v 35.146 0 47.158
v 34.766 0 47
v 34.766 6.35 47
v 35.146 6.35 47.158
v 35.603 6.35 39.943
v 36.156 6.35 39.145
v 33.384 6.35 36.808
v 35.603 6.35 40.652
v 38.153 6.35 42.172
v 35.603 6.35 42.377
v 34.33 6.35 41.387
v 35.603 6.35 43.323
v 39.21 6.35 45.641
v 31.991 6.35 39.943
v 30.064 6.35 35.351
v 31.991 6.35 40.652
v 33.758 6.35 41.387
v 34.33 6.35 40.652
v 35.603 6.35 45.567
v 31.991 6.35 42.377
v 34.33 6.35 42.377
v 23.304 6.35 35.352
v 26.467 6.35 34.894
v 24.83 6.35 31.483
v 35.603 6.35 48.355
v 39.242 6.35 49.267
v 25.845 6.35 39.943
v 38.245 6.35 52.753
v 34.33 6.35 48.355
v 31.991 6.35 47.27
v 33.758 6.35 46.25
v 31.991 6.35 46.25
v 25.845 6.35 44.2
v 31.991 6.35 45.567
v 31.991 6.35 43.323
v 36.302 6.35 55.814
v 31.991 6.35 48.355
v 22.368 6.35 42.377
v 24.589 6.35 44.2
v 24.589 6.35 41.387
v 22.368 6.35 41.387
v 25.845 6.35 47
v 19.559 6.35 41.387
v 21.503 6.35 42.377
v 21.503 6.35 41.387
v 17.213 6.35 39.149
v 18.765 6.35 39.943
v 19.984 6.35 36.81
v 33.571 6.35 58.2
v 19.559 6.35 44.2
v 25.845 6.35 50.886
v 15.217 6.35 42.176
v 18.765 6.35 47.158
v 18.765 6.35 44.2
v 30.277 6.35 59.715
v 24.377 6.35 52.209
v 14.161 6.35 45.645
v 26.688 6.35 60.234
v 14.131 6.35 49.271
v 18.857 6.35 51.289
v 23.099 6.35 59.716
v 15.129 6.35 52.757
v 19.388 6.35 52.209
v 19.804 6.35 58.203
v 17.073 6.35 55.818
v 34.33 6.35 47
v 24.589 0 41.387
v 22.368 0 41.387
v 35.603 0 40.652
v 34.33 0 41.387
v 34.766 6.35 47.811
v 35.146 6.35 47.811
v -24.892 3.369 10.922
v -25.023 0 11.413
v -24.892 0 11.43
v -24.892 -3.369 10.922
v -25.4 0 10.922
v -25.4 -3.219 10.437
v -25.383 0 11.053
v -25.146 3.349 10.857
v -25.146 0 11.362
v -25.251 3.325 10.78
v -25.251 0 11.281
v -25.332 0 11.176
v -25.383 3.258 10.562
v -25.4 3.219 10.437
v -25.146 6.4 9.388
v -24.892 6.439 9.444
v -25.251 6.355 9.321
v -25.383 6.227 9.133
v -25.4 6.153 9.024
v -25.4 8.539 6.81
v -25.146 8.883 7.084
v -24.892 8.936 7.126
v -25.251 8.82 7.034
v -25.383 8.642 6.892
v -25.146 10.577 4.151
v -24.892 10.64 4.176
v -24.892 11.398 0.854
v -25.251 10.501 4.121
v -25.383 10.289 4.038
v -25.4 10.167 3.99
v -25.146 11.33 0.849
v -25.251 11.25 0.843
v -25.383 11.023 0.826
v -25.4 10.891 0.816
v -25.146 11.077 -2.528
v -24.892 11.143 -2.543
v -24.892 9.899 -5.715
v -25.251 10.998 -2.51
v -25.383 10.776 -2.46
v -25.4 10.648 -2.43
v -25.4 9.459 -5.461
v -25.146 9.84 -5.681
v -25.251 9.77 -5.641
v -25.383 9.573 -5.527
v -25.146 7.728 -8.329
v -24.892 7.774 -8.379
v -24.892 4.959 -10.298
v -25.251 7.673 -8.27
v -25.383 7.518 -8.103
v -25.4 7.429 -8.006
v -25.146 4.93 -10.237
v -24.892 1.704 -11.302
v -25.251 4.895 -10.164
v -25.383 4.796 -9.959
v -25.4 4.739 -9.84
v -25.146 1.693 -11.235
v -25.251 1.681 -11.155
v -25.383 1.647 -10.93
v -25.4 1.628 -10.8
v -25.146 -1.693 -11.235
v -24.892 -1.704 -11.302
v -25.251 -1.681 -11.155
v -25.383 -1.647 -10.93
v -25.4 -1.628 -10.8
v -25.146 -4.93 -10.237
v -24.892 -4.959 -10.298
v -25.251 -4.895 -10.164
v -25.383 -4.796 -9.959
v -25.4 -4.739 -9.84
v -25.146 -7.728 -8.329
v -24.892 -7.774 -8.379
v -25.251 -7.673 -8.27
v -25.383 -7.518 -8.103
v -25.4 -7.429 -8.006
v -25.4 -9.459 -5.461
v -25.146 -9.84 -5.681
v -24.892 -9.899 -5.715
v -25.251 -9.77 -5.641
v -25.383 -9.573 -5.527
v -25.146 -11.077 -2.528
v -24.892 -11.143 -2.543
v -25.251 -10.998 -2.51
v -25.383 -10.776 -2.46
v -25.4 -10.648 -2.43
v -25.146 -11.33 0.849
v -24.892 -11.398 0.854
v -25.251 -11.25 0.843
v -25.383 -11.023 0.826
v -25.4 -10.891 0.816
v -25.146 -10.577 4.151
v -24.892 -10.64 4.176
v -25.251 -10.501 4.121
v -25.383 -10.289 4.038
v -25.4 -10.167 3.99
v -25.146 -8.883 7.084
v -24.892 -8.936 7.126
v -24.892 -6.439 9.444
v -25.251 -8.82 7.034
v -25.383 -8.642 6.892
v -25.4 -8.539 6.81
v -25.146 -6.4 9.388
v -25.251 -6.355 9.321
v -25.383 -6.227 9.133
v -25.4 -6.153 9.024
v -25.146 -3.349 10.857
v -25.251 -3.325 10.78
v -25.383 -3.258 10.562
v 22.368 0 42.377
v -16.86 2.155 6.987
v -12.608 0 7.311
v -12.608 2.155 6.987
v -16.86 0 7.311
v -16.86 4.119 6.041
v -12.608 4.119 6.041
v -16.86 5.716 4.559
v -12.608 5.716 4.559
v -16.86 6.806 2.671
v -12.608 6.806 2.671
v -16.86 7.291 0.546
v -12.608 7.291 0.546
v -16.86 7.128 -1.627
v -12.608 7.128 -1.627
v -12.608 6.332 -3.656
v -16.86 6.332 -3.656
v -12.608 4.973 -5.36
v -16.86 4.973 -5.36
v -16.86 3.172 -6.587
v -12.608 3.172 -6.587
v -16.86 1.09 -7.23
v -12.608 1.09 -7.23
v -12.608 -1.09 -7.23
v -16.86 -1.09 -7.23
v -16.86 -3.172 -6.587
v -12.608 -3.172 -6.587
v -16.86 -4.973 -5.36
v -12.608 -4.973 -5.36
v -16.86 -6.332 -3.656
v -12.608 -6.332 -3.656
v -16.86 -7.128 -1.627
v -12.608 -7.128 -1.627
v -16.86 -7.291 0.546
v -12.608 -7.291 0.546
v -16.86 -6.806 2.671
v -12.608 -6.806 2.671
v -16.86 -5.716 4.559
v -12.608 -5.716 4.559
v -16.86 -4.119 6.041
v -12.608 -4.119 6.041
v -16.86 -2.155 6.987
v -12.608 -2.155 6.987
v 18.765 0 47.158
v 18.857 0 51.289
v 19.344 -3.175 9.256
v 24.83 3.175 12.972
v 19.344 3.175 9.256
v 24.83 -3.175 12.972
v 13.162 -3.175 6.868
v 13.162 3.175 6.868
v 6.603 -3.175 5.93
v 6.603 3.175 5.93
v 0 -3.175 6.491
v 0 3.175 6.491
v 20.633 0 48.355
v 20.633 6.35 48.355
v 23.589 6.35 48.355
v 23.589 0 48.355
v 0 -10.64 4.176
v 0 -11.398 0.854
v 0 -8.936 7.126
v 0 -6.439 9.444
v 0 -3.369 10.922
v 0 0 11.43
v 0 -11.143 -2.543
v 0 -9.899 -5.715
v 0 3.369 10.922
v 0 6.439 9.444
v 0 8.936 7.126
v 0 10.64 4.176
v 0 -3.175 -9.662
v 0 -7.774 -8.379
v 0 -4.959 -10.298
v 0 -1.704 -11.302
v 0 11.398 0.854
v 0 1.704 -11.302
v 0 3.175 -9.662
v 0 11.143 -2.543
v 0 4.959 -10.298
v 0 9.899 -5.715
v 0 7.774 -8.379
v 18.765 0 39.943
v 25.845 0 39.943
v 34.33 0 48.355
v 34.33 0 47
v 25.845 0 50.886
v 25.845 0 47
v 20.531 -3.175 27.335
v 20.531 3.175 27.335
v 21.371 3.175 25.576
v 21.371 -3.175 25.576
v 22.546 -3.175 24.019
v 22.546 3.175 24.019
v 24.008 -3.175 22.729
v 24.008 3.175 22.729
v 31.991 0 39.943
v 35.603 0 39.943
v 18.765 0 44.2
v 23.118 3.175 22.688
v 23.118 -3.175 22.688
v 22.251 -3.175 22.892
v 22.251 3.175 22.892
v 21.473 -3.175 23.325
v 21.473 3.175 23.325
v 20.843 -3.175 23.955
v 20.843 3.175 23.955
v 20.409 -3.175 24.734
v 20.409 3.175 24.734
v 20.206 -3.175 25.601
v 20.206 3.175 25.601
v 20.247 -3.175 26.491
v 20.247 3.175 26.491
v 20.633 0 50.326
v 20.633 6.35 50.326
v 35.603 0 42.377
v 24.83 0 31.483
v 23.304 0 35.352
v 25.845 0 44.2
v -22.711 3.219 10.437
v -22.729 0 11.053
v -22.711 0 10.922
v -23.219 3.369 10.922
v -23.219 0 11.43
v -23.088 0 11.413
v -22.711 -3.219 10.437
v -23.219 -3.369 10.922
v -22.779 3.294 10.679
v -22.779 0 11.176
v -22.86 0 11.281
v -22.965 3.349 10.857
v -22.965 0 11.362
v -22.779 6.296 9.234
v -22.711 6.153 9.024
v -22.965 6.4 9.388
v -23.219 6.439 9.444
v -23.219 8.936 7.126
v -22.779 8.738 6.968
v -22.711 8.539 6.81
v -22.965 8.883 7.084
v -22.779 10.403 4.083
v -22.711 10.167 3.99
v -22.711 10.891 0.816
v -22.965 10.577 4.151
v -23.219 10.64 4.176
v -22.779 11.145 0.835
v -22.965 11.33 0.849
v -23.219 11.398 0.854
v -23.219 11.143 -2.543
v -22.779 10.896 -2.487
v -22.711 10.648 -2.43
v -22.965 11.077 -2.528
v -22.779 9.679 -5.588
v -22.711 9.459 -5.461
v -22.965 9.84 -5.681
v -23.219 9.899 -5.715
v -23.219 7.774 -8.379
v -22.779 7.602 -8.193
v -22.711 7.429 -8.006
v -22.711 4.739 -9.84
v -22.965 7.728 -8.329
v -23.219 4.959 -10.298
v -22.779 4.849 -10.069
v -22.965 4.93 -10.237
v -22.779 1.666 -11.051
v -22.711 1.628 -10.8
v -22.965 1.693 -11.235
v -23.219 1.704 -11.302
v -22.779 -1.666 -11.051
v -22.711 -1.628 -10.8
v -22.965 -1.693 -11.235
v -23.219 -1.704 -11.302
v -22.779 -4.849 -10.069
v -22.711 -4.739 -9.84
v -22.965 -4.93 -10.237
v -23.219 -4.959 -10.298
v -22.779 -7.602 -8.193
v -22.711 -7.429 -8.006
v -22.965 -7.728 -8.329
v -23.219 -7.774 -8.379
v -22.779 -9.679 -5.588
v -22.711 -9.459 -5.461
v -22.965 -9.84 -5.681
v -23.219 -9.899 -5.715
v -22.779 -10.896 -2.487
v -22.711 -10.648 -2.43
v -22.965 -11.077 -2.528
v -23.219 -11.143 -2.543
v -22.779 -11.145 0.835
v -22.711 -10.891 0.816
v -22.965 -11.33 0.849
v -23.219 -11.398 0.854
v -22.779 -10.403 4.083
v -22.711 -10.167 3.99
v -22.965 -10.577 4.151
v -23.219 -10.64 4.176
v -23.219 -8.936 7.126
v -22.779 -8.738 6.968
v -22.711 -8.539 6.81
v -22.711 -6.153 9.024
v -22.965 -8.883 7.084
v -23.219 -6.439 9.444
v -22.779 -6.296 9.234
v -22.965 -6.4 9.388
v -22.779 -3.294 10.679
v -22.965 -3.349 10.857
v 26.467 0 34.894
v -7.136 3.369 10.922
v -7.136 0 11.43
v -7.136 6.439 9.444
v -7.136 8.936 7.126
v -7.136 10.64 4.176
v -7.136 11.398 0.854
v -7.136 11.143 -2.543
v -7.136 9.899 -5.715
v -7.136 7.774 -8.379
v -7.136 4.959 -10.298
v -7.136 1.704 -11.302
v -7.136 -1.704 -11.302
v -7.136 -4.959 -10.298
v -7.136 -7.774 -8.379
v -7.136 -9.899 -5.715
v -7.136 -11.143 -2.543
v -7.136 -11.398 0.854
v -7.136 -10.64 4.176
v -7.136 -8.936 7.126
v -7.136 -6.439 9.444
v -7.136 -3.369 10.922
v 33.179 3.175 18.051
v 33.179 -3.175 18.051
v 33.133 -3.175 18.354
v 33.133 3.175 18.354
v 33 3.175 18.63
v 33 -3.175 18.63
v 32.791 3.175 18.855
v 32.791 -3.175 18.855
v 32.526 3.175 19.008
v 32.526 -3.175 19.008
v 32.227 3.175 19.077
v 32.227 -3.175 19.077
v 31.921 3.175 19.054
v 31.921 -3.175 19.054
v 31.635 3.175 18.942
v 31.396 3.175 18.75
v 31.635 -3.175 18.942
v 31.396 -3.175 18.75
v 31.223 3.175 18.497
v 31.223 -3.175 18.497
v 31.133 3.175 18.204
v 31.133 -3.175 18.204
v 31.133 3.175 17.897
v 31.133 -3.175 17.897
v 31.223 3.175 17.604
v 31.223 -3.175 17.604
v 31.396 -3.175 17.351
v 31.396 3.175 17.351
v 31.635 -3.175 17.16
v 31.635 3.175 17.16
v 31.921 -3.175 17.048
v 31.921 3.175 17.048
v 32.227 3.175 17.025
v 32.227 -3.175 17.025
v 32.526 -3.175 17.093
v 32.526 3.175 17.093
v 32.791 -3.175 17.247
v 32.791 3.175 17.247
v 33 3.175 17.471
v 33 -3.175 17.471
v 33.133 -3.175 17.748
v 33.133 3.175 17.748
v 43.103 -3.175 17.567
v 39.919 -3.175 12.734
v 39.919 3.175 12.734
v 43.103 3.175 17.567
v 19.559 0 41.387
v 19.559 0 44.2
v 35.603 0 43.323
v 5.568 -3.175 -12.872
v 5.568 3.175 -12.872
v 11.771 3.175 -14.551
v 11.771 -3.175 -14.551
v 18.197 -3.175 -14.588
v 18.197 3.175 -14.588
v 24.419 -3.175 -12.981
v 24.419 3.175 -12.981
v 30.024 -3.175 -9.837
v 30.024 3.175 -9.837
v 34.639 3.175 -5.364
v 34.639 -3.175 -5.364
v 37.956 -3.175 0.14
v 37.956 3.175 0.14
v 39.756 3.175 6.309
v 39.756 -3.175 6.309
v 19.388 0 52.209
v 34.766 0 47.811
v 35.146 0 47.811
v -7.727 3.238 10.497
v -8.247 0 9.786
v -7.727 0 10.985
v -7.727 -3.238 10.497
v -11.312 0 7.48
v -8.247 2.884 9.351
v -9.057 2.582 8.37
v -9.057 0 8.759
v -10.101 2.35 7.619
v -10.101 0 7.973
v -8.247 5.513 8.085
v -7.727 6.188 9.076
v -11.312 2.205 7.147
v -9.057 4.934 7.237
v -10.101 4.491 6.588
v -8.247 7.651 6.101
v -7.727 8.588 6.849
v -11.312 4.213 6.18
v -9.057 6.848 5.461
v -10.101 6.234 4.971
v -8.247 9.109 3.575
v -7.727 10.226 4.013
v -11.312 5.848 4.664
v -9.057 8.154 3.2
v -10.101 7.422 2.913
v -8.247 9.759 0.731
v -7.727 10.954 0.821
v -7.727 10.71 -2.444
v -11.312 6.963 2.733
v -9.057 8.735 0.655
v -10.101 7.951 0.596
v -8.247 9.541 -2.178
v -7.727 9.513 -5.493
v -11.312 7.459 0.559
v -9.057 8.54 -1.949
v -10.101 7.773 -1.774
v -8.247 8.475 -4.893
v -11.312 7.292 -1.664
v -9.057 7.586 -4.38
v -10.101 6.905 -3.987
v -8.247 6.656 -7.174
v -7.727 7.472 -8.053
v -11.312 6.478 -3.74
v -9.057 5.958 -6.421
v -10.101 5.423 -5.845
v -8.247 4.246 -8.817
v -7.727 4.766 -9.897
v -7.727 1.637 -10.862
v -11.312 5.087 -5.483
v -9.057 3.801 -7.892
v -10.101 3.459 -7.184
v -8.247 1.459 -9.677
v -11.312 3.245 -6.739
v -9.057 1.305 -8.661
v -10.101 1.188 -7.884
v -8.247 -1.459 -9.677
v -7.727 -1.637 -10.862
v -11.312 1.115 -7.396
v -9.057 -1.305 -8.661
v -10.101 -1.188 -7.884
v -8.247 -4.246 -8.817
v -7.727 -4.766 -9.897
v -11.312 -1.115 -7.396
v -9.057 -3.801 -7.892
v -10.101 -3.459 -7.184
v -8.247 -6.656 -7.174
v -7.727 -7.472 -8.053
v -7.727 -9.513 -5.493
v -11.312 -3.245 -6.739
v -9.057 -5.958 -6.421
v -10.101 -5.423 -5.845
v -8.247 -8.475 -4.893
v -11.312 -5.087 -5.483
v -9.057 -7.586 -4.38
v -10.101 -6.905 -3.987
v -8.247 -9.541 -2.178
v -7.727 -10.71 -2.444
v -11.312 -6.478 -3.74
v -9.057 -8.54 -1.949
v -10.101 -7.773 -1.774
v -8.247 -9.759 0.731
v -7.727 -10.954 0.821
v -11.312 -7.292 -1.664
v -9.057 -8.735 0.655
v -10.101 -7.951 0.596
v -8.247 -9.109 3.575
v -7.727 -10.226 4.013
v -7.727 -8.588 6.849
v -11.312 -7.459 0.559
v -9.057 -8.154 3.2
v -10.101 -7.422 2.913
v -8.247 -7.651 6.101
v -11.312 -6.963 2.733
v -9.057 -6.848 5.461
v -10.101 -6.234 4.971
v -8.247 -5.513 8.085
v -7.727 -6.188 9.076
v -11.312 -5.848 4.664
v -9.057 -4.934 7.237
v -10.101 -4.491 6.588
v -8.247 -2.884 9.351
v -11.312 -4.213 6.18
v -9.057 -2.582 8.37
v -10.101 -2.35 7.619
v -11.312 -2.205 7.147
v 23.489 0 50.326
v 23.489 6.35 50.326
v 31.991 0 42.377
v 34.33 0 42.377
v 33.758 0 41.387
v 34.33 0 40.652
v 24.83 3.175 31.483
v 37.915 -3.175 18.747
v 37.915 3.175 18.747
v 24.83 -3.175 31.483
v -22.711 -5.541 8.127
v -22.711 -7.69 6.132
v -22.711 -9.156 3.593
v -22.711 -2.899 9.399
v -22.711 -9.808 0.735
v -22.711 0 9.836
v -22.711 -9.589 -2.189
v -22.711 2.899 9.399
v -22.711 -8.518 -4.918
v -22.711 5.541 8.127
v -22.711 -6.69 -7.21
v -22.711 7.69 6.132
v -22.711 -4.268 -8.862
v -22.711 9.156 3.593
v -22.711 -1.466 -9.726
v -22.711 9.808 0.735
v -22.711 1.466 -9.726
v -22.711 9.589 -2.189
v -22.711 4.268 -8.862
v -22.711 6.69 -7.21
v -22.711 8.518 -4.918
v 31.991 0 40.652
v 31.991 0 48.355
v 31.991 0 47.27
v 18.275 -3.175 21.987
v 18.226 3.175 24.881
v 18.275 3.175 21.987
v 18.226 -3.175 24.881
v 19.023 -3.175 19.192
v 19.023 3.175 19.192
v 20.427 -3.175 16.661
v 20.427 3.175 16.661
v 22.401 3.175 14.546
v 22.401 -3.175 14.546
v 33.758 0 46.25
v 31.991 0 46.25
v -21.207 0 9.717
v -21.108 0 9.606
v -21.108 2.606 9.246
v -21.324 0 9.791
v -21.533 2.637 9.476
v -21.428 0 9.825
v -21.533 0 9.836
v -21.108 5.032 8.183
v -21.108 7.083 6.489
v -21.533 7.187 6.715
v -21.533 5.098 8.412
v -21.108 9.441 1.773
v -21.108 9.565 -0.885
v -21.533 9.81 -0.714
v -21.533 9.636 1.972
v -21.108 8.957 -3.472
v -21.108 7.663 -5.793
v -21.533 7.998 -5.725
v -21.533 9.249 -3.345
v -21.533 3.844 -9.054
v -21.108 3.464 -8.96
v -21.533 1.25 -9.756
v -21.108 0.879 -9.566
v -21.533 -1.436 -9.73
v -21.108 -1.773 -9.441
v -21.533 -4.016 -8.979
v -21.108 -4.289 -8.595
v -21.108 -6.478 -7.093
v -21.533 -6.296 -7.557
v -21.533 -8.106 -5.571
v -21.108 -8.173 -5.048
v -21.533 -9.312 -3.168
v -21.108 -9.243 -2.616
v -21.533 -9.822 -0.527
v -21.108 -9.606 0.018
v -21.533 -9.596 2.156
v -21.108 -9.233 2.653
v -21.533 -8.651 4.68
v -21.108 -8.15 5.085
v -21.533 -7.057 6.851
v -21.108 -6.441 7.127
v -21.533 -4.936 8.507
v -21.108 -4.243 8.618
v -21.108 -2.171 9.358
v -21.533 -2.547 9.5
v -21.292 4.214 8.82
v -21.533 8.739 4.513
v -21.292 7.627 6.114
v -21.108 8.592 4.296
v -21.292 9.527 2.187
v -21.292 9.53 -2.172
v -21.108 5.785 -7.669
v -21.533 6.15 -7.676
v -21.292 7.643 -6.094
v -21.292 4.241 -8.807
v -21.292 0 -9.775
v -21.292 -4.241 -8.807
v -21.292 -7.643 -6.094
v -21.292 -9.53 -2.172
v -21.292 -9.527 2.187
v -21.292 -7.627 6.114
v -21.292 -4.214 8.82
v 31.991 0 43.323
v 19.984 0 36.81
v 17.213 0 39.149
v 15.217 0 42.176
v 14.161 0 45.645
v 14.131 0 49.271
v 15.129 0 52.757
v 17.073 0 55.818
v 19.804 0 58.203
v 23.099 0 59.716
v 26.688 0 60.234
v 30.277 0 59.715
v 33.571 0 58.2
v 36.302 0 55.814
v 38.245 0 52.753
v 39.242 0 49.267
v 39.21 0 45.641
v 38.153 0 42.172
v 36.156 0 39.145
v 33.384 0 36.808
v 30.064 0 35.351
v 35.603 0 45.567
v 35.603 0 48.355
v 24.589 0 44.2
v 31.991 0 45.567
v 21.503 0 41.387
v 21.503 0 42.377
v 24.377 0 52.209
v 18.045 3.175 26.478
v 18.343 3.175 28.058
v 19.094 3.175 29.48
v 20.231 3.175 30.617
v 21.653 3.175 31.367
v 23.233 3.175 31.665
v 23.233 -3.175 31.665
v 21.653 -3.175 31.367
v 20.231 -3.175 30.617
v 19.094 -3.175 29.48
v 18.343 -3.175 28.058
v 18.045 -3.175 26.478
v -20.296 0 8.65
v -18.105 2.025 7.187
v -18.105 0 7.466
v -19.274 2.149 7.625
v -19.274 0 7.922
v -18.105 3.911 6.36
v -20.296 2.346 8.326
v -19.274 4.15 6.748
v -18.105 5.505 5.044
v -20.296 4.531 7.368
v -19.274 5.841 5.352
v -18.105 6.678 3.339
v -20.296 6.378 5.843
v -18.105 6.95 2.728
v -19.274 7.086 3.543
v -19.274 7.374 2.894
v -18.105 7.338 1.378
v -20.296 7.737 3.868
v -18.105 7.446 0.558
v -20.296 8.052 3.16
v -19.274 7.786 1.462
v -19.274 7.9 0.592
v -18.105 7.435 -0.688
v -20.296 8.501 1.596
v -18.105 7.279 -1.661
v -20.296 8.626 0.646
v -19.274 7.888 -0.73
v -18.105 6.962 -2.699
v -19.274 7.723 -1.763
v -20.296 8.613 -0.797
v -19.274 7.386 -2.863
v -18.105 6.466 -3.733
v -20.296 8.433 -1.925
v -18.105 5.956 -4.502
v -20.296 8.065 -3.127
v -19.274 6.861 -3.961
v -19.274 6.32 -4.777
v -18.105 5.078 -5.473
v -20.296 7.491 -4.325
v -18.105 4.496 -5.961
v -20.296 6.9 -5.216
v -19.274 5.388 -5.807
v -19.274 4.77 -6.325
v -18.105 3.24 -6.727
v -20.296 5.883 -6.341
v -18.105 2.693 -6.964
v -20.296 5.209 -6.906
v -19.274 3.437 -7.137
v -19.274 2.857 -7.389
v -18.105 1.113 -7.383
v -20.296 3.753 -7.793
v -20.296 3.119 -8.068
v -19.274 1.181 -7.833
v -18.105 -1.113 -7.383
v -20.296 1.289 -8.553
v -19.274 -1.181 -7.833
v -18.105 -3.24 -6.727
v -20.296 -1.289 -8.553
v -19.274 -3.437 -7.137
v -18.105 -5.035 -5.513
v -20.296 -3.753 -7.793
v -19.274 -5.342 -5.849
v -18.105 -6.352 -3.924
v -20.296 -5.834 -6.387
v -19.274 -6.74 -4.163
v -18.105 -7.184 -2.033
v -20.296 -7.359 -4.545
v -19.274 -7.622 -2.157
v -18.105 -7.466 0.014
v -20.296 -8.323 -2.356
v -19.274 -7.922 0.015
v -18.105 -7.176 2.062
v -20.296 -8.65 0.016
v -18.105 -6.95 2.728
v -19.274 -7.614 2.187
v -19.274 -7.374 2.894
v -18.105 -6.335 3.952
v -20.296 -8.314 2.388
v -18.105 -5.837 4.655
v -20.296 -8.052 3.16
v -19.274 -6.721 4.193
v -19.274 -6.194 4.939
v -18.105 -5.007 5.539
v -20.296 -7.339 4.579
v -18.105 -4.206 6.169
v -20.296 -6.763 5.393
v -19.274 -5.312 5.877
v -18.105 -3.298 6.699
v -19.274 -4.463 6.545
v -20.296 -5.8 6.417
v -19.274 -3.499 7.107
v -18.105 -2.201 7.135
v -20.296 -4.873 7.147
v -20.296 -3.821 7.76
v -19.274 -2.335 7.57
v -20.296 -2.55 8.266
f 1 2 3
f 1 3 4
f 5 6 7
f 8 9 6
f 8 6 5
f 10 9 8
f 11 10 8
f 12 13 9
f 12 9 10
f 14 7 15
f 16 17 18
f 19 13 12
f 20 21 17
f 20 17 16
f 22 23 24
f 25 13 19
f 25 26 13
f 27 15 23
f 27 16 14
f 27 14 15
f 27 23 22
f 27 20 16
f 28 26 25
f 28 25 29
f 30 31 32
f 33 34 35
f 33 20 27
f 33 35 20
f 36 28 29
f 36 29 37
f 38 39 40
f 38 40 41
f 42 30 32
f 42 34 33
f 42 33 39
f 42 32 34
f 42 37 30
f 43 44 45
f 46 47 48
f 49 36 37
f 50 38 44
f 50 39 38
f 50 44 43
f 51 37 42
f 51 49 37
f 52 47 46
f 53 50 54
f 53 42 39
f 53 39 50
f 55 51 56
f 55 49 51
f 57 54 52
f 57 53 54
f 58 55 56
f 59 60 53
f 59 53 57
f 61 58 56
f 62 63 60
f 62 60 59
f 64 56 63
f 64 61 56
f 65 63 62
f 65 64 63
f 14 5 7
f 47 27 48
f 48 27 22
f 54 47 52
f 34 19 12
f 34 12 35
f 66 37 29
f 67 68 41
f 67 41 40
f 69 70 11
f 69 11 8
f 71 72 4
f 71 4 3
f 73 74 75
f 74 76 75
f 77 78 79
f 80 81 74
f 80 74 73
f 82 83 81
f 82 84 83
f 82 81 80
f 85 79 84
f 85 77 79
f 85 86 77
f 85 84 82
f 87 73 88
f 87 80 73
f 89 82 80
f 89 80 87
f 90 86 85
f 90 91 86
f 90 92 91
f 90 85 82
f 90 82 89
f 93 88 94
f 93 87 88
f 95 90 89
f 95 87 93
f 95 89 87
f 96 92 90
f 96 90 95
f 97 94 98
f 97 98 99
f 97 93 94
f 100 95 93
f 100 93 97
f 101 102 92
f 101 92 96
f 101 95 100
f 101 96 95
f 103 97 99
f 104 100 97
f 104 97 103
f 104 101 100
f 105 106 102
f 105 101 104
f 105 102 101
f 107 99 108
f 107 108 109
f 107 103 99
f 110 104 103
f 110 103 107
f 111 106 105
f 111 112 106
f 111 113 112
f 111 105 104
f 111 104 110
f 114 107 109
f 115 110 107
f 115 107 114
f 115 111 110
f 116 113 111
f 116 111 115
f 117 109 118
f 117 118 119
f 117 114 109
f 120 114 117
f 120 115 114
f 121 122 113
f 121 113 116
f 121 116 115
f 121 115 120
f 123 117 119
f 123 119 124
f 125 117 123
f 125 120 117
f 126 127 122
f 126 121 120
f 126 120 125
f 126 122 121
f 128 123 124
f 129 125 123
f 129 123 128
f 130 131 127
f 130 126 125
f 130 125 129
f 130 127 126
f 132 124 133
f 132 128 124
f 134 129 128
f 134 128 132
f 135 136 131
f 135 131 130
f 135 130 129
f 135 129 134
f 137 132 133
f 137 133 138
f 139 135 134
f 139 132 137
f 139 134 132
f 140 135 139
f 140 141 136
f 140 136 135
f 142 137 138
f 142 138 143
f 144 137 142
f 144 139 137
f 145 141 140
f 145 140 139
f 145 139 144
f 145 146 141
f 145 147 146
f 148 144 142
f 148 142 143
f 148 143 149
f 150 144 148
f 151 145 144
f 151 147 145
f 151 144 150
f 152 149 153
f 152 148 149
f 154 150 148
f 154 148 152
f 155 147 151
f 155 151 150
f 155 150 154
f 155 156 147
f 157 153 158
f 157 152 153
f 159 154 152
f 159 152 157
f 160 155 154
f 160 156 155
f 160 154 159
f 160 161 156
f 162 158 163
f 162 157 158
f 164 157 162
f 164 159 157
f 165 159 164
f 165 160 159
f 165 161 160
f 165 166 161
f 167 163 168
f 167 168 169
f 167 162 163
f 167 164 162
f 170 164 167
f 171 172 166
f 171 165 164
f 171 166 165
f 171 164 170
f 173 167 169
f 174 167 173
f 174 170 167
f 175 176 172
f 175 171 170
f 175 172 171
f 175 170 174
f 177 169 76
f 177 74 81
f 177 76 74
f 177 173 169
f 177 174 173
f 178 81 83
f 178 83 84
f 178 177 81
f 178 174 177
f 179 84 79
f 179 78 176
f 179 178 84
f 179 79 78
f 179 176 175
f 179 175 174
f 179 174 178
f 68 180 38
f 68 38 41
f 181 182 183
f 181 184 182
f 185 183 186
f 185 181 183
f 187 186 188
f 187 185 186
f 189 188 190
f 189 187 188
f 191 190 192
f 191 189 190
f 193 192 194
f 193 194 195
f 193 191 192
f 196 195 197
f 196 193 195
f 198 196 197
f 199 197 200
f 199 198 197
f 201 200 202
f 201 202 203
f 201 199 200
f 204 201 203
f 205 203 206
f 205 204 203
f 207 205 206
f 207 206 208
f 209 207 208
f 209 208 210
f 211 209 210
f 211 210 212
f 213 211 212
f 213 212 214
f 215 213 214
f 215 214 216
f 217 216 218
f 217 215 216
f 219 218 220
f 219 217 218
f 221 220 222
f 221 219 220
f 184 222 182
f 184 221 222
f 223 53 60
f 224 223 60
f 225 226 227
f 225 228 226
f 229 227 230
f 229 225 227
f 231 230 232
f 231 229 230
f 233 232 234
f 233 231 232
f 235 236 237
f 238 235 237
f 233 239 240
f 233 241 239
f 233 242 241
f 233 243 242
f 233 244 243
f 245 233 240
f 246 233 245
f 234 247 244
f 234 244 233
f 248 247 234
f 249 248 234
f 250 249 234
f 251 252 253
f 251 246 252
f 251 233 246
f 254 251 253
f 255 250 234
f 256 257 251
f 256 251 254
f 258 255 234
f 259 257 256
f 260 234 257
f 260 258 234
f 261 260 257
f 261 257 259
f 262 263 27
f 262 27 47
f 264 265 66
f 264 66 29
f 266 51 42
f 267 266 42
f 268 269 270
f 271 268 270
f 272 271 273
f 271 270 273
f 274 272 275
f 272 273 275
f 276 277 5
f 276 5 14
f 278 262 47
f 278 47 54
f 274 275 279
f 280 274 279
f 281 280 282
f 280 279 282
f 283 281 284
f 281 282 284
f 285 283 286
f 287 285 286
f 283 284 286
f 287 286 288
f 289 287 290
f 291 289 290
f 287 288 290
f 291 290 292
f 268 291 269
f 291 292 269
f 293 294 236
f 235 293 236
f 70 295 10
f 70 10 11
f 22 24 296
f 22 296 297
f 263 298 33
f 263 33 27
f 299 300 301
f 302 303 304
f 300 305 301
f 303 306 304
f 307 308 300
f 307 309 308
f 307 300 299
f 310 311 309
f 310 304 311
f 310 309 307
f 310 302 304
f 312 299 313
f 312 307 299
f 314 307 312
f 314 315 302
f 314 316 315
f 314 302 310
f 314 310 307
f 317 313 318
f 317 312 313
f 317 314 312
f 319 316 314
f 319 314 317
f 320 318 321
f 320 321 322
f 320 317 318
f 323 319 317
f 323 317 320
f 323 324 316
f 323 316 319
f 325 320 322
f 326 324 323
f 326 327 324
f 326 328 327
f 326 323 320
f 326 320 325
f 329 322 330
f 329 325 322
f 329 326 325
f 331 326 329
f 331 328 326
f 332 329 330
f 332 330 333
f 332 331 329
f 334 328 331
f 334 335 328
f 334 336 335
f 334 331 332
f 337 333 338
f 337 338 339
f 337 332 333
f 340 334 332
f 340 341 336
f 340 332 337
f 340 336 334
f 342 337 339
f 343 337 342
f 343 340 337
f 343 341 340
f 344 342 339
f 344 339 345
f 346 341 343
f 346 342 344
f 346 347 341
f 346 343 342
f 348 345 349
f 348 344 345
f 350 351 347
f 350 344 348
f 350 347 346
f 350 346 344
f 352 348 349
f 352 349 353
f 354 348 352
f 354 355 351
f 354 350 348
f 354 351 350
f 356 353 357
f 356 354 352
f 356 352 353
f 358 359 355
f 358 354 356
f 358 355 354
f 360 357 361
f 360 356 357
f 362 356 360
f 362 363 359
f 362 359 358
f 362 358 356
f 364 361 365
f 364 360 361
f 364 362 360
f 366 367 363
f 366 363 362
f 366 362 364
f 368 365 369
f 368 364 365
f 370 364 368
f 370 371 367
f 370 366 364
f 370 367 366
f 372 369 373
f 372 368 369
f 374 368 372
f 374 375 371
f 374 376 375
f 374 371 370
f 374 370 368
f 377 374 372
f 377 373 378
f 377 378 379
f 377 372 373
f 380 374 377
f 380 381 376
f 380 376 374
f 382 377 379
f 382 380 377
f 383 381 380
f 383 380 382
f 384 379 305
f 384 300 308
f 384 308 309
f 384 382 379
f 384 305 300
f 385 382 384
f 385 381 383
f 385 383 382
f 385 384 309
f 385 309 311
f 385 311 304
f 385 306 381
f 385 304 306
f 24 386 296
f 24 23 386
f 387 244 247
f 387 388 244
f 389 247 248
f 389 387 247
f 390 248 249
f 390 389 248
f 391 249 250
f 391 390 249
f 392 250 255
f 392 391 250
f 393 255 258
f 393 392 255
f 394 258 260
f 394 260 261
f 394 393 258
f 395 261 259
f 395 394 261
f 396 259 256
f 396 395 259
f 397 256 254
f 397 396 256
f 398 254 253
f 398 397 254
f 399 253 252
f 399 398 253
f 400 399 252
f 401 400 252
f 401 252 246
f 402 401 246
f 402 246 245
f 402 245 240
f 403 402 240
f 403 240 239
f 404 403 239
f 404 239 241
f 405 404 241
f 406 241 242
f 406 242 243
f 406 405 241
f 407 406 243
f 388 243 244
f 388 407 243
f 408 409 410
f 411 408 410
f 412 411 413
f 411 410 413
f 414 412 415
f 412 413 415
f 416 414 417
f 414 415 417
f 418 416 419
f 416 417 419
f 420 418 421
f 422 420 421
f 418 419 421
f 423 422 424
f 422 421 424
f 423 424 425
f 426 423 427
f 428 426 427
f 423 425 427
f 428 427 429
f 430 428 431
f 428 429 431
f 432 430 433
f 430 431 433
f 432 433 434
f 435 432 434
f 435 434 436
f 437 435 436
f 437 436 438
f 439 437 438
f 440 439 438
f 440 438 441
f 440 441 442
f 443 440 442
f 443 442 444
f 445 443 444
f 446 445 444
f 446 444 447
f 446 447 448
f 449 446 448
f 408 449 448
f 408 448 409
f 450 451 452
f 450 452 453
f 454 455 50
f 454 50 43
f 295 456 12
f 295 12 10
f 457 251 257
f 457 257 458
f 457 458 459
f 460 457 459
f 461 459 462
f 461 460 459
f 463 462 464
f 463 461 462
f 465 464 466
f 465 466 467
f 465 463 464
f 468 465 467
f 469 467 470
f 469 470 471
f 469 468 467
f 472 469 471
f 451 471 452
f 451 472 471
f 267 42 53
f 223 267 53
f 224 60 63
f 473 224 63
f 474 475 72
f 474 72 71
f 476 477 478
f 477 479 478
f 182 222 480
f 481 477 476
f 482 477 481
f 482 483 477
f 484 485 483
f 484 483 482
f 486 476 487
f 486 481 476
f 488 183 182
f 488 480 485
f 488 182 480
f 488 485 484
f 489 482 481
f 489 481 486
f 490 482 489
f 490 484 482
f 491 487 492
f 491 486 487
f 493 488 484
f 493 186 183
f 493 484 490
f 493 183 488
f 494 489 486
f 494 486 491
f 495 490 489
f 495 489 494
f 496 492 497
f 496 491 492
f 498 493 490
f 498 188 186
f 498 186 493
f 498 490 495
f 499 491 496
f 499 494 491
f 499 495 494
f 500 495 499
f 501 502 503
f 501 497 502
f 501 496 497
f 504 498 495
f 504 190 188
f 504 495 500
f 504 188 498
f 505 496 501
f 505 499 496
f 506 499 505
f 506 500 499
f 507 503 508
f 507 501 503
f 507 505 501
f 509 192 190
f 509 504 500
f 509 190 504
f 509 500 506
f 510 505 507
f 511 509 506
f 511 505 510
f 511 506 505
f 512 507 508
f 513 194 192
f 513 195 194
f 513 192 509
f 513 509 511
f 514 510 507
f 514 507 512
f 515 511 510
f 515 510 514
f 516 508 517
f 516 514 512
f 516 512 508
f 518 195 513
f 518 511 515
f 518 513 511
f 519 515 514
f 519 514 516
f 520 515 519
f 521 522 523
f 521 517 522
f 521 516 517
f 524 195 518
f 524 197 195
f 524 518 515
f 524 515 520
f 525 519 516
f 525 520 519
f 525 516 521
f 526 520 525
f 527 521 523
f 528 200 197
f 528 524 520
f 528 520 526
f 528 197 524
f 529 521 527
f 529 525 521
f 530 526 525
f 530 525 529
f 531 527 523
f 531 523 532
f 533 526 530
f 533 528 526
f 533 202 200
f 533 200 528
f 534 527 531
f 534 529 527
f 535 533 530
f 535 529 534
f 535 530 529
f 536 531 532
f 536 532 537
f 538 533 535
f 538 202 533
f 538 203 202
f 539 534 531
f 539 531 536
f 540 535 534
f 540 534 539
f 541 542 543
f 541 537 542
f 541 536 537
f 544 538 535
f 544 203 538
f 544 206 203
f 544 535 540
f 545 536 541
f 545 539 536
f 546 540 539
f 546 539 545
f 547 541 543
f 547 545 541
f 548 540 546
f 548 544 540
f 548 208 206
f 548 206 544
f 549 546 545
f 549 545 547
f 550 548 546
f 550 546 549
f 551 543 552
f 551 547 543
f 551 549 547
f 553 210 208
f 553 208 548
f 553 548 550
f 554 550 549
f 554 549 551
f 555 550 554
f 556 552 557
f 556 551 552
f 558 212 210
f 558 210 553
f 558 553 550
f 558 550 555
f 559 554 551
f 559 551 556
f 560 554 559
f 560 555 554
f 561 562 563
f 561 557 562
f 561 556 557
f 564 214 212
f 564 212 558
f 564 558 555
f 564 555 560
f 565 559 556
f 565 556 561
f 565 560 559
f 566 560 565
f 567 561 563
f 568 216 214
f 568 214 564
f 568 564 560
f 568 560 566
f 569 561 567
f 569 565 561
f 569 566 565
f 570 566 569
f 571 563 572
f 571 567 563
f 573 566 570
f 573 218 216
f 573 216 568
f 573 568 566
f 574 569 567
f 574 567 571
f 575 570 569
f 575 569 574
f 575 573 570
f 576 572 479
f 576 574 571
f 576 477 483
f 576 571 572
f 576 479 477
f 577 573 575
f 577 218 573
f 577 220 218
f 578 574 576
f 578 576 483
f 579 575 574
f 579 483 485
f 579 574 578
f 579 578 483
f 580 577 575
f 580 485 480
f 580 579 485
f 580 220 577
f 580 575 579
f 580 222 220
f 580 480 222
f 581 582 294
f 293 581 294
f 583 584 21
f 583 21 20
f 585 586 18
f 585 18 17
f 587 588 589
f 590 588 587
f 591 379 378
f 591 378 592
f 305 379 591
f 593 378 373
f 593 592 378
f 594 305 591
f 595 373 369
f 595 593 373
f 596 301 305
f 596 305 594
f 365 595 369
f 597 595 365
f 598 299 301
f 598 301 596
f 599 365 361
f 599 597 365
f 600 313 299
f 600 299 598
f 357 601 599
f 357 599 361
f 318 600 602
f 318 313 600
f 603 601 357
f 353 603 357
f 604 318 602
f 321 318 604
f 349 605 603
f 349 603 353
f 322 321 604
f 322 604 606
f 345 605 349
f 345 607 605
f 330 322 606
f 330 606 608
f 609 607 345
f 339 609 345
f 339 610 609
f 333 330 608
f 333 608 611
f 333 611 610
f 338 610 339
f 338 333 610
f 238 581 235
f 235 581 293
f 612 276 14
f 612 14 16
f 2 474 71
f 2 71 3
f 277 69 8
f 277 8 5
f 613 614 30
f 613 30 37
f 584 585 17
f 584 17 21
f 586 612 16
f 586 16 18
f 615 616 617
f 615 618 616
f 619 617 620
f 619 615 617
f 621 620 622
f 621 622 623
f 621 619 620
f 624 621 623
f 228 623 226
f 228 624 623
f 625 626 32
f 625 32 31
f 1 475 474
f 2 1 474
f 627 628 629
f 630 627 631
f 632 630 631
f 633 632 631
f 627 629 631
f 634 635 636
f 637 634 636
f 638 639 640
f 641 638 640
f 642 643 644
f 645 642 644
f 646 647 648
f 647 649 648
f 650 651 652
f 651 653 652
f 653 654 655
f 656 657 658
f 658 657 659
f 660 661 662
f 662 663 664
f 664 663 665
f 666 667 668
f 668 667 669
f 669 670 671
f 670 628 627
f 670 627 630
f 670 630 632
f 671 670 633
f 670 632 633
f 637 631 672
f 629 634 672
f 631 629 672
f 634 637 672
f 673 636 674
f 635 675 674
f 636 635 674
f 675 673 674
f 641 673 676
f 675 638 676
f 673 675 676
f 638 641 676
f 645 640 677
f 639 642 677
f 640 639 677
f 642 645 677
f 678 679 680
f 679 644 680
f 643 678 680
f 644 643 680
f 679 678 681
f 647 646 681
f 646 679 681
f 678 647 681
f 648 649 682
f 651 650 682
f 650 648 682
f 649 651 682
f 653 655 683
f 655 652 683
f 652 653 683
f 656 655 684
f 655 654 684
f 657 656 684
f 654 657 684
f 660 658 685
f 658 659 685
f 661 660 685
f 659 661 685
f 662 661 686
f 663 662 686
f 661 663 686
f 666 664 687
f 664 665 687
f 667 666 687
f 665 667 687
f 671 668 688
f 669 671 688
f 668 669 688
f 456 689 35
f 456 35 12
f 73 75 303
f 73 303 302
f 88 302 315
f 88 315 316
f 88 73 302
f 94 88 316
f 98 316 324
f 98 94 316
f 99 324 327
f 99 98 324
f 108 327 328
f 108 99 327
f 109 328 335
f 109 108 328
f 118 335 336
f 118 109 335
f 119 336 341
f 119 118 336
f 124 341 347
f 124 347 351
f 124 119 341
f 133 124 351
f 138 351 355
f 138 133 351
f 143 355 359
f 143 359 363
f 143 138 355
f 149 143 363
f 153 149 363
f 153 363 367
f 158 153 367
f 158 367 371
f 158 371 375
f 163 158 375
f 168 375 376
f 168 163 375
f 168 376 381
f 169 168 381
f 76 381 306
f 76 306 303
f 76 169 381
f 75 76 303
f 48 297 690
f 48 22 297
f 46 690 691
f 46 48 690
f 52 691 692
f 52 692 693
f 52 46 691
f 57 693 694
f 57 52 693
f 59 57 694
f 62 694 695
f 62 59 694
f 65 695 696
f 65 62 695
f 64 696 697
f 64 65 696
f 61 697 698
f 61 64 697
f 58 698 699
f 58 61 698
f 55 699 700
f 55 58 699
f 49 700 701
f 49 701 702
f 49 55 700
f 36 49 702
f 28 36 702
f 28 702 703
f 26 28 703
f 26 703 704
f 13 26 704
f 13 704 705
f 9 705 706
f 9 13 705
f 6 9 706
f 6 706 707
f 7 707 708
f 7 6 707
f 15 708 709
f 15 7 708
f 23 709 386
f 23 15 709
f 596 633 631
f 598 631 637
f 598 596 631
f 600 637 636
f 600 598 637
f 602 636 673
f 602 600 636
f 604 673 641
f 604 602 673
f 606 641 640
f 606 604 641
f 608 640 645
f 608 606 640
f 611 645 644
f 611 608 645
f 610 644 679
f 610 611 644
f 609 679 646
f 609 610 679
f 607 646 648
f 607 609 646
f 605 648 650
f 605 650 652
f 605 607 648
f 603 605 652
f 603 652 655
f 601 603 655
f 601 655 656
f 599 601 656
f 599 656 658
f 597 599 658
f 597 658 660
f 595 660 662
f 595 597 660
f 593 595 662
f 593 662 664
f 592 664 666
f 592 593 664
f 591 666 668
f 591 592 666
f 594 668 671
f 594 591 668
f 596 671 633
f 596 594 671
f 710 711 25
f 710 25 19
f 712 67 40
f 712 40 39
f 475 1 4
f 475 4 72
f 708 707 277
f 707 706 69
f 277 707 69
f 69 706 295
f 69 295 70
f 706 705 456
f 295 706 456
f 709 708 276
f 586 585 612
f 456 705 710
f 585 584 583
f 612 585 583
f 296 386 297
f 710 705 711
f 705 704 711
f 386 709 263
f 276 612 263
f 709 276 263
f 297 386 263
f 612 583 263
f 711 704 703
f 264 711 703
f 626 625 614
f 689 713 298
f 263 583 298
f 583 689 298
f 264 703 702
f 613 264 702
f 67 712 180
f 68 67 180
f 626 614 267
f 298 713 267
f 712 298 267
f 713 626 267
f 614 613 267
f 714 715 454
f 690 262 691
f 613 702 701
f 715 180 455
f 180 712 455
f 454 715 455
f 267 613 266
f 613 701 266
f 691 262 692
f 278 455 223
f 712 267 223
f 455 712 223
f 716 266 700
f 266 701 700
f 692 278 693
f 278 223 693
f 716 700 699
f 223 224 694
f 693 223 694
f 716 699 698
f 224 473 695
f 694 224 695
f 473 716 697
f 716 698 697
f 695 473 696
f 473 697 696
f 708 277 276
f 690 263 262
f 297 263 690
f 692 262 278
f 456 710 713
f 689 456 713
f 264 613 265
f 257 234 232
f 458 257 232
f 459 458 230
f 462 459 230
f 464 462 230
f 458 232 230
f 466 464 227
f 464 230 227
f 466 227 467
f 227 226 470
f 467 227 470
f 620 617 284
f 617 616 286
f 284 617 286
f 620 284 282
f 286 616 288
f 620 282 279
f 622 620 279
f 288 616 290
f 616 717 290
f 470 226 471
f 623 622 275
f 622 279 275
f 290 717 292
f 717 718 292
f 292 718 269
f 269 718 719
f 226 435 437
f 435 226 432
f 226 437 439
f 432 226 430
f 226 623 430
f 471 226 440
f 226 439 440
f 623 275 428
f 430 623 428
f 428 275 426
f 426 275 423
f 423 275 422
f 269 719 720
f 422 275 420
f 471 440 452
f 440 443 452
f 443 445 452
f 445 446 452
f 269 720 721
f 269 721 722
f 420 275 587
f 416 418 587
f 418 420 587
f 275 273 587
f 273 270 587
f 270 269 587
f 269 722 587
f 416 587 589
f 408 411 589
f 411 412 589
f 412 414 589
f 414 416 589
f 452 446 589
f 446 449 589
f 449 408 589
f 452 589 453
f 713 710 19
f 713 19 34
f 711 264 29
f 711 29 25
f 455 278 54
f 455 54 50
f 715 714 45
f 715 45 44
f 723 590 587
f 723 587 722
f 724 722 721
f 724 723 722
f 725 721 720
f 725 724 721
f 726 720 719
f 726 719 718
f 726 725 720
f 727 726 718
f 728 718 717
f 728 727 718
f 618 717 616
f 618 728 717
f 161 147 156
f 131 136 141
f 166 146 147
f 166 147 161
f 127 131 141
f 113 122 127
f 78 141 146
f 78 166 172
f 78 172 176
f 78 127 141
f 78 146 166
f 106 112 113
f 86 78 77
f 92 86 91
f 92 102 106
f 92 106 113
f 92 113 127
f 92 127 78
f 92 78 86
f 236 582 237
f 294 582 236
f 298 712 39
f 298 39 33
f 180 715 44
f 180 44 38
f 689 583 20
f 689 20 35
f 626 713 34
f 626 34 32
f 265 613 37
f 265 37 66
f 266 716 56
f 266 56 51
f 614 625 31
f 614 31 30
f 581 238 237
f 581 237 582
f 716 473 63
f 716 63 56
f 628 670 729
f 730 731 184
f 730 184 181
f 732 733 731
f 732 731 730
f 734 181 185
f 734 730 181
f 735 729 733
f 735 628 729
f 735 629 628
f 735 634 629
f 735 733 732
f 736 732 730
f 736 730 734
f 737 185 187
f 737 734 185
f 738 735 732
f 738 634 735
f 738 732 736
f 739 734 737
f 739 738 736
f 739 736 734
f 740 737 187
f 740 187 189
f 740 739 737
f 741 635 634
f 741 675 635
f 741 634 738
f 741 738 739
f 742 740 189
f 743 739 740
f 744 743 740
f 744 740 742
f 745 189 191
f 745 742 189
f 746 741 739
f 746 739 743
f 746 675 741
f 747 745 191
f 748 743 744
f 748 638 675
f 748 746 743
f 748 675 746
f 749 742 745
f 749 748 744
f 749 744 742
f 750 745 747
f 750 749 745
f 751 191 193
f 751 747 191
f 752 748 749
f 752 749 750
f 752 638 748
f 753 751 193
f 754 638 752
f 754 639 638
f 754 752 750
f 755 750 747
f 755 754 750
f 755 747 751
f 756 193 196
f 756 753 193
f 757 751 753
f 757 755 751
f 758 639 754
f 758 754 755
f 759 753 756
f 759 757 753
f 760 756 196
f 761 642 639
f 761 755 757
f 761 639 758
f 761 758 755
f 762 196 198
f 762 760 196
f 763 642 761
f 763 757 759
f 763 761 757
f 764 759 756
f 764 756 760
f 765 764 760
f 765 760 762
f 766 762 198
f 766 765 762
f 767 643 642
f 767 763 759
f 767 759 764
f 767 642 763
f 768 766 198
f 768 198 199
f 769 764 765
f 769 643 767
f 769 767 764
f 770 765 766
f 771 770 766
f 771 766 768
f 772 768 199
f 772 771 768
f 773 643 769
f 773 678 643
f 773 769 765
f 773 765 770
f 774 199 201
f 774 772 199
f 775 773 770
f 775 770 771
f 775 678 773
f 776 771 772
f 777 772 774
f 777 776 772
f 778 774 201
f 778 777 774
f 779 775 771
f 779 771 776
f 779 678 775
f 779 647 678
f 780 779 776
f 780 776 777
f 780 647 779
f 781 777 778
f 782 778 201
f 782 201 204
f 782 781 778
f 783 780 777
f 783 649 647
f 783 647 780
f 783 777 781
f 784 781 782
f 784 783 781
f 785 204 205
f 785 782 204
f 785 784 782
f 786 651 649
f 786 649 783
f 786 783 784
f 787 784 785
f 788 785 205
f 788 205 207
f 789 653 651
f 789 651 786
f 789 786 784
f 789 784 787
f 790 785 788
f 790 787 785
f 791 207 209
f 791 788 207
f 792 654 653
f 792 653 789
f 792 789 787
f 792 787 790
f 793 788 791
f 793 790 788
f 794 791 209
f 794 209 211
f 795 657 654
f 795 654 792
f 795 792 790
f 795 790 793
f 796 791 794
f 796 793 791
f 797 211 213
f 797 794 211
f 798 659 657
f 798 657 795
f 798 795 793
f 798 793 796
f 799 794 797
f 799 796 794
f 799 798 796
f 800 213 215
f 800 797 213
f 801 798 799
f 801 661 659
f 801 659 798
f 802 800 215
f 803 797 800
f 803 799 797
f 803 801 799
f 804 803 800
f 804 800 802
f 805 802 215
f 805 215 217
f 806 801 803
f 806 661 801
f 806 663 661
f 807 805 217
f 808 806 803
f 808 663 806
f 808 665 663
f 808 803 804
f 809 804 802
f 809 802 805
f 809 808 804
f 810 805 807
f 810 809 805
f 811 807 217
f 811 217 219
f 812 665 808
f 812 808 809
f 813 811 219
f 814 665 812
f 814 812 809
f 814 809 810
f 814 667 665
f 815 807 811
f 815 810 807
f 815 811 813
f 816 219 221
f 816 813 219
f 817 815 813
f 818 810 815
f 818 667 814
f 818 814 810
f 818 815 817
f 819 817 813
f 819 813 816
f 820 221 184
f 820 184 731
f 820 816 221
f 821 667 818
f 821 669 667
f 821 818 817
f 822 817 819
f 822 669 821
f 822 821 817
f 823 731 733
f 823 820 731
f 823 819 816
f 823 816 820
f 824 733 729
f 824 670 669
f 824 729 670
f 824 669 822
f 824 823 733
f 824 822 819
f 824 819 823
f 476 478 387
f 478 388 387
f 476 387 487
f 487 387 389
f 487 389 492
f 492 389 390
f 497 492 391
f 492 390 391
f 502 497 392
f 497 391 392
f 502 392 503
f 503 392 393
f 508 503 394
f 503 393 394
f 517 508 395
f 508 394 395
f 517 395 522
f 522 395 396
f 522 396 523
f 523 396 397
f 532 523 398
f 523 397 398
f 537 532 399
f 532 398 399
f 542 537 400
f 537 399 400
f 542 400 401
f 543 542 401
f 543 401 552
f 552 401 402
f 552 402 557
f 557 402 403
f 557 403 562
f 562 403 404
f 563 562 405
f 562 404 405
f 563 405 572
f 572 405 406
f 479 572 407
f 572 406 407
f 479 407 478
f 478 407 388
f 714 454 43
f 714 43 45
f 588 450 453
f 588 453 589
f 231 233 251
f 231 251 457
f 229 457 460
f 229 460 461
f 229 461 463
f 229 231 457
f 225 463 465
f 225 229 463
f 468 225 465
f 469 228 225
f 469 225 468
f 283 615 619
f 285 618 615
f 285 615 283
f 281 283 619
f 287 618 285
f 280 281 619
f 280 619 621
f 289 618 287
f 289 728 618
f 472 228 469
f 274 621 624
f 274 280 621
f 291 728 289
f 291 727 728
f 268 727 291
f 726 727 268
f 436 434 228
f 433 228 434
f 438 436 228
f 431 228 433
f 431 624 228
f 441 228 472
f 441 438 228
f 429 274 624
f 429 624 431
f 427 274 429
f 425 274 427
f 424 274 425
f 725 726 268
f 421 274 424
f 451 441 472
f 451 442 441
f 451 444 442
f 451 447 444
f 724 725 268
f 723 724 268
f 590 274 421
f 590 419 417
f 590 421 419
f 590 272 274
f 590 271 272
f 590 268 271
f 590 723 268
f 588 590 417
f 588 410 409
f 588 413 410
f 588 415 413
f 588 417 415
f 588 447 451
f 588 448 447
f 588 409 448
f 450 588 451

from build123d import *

# Parameters (mm, degrees)
F4_R      = 0.508
F7_DEPTH  = 3.175
F9_D      = 2.0574
F11_DEPTH = 12.7
F13_DEPTH = 3.175
F15_DEPTH = 12.7


# Not quite as in the source:
# - a fillet or chamfer that OpenCascade refuses, or shapes differently, is made with other operations: its cross-section is extruded or revolved along the edge and cut away or added


with BuildPart() as f1:
    # F0 (on Front) → F1 (revolve)
    with BuildSketch(Plane.XZ):
        Polygon((-25.4, 0), (0, 0), (0, 11.43), (-7.62, 11.43), (-7.62, 7.3114731075), (-20.32, 7.3114731075), (-21.2499899719, 9.835730216), (-22.7114037935, 9.835730216), (-22.7114037935, 11.43), (-25.4, 11.43), align=None)
    revolve(axis=Axis((-12.7, 0, 0), (-1, 0, 0)))

    # F2: fillet of radius 5.08 on 1 edges, made by hand

    # F2_s1 → F2_t2 (revolve)
    with BuildSketch(Plane.XZ):
        with BuildLine():
            ThreePointArc((-16.8597077176, 7.3114731075), (-19.3918240371, 7.9875218198), (-21.2499899719, 9.835730216))
            Line((-21.2499899719, 9.835730216), (-20.32, 7.3114731075))
            Line((-20.32, 7.3114731075), (-16.8597077176, 7.3114731075))
        make_face()
    revolve(axis=Axis((-20.32, 0, 0), (-1, 0, 0)))

    # F3: fillet of radius 5.08 on 1 edges, made by hand

    # F3_s1 → F3_t2 (revolve)
    with BuildSketch(Plane.XZ):
        with BuildLine():
            ThreePointArc((-7.62, 11.43), (-9.3738270483, 8.4741600369), (-12.6081829822, 7.3114731075))
            Line((-12.6081829822, 7.3114731075), (-7.62, 7.3114731075))
            Line((-7.62, 7.3114731075), (-7.62, 11.43))
        make_face()
    revolve(axis=Axis((-7.62, 0, 0), (-1, 0, 0)))

    # F4
    f4_edges = [f1.edges().sort_by_distance(p)[0] for p in [
        (-21.24999, 0, -9.83573),
        (-22.711404, 0, -11.43),
        (-25.4, 0, -11.43),
    ]]
    fillet(f4_edges, radius=F4_R)

    # F5: chamfer of 0.508 on 1 edges, made by hand

    # F5_s1 → F5_t2 (revolve, cut)
    with BuildSketch(Plane.XZ):
        with BuildLine():
            Line((-7.7429817287, 10.9728511125), (-7.1192910196, 11.442218632))
            Line((-7.1192910196, 11.442218632), (-7.1192910196, 11.452378632))
            ThreePointArc((-7.1192910196, 11.452378632), (-7.3696455098, 11.44016), (-7.62, 11.44016))
            Line((-7.62, 11.44016), (-7.629976366, 11.4319229462))
            ThreePointArc((-7.629976366, 11.4319229462), (-7.6800748035, 11.2010835053), (-7.7527446032, 10.9756639192))
            Line((-7.7527446032, 10.9756639192), (-7.7429817287, 10.9728511125))
        make_face()
    revolve(axis=Axis((-7.62, 0, 0), (-1, 0, 0)), mode=Mode.SUBTRACT)

    # F6 (on Front) → F7 (join, symmetric)
    with BuildSketch(Plane.XZ):
        with BuildLine():
            Line((0, 6.4907935448), (0, -9.6620609984))
            ThreePointArc((0, -9.6620609984), (27.3235808445, -11.5905018684), (39.9187803268, 12.7335172147))
            Line((39.9187803268, 12.7335172147), (43.1029349566, 17.5670832396))
            Line((43.1029349566, 17.5670832396), (37.9153452814, 18.7469273806))
            Line((37.9153452814, 18.7469273806), (24.8299874365, 31.4825810492))
            ThreePointArc((24.8299874365, 31.4825810492), (19.6194729327, 30.0910701799), (18.2263422757, 24.8809885234))
            ThreePointArc((18.2263422757, 24.8809885234), (19.6474301741, 17.8834645614), (24.8299874365, 12.9716489464))
            ThreePointArc((24.8299874365, 12.9716489464), (13.1623202589, 6.8680022006), (0, 6.4907935448))
        make_face()
    extrude(amount=F7_DEPTH, both=True)

    # F9 (through all)
    with Locations(Plane(origin=(0, 3.175, 0), x_dir=(-1, 0, 0), z_dir=(0, 1, 0))):
        with Locations((-32.1498028934, 18.0507935584)):
            Hole(F9_D / 2)

    # F10 (on face) → F11 (cut, symmetric)
    with BuildSketch(Plane(origin=(0, 3.175, 0), x_dir=(-1, 0, 0), z_dir=(0, 1, 0))):
        with BuildLine():
            ThreePointArc((-20.5308888108, 27.3354519159), (-21.9193644523, 24.7679811752), (-24.0082591772, 22.7292831987))
            ThreePointArc((-24.0082591772, 22.7292831987), (-20.8428543324, 23.9552831131), (-20.5308888108, 27.3354519159))
        make_face()
    extrude(amount=F11_DEPTH, both=True, mode=Mode.SUBTRACT)


with BuildPart() as f13:
    # F12 (on face) → F13 (new body, symmetric)
    with BuildSketch(Plane(origin=(0, 3.175, 0), x_dir=(-1, 0, 0), z_dir=(0, 1, 0))):
        with BuildLine():
            Line((-26.4666415751, 34.8943322897), (-24.8299874365, 31.4825810492))
            Line((-24.8299874365, 31.4825810492), (-23.3040340245, 35.3521183133))
            ThreePointArc((-23.3040340245, 35.3521183133), (-28.5012203621, 60.1034931642), (-26.4666415751, 34.8943322897))
        make_face()
    extrude(amount=F13_DEPTH, both=True)

    # F14 (on face) → F15 (cut, symmetric)
    with BuildSketch(Plane(origin=(0, 6.35, 0), x_dir=(-1, 0, 0), z_dir=(0, 1, 0))):
        Polygon((-35.6027372181, 39.9427898228), (-31.9911800325, 39.9427898228), (-31.9911800325, 40.6517386436), (-34.3299508095, 40.6517386436), (-33.757902766, 41.3867458701), (-34.3299508095, 42.3773415387), (-31.9911800325, 42.3773415387), (-31.9911800325, 43.3226935565), (-35.6027372181, 43.3226935565), (-35.6027372181, 42.3773415387), (-34.3299508095, 41.3867458701), (-35.6027372181, 40.6517386436), align=None)
        Polygon((-35.6027372181, 45.567497611), (-31.9911800325, 45.567497611), (-31.9911800325, 46.2499822183), (-33.757902766, 46.2499822183), (-31.9911800325, 47.2702272236), (-31.9911800325, 48.3551248908), (-34.3299508095, 47.0000132918), (-34.3299508095, 48.3551248908), (-35.6027372181, 48.3551248908), align=None)
        Polygon((-34.7663201392, 47.0000132918), (-35.1461172104, 47.1575073898), (-35.1461172104, 47.8113219142), (-34.7663201392, 47.8113219142), align=None, mode=Mode.SUBTRACT)
        Polygon((-25.8445478976, 44.1996492445), (-25.8445478976, 39.9427898228), (-18.765181303, 39.9427898228), (-18.765181303, 44.1996492445), (-19.5589084178, 44.1996492445), (-19.5589084178, 41.3867458701), (-21.5028319508, 41.3867458701), (-21.5028319508, 42.3773415387), (-22.3683007061, 42.3773415387), (-22.3683007061, 41.3867458701), (-24.5892498642, 41.3867458701), (-24.5892498642, 44.1996492445), align=None)
        Polygon((-25.8445478976, 50.8860163391), (-25.8445478976, 47.0000132918), (-18.765181303, 47.1575073898), (-18.8570892325, 51.2887728417), (-19.388453251, 52.2089174014), (-24.377239868, 52.2089174014), align=None)
        Polygon((-20.6333789974, 48.3551248908), (-23.5887039453, 48.3551248908), (-23.4892610461, 50.3255613148), (-20.6333789974, 50.3255613148), align=None, mode=Mode.SUBTRACT)
    extrude(amount=F15_DEPTH, both=True, mode=Mode.SUBTRACT)


solid = Compound([f1.part, f13.part])
